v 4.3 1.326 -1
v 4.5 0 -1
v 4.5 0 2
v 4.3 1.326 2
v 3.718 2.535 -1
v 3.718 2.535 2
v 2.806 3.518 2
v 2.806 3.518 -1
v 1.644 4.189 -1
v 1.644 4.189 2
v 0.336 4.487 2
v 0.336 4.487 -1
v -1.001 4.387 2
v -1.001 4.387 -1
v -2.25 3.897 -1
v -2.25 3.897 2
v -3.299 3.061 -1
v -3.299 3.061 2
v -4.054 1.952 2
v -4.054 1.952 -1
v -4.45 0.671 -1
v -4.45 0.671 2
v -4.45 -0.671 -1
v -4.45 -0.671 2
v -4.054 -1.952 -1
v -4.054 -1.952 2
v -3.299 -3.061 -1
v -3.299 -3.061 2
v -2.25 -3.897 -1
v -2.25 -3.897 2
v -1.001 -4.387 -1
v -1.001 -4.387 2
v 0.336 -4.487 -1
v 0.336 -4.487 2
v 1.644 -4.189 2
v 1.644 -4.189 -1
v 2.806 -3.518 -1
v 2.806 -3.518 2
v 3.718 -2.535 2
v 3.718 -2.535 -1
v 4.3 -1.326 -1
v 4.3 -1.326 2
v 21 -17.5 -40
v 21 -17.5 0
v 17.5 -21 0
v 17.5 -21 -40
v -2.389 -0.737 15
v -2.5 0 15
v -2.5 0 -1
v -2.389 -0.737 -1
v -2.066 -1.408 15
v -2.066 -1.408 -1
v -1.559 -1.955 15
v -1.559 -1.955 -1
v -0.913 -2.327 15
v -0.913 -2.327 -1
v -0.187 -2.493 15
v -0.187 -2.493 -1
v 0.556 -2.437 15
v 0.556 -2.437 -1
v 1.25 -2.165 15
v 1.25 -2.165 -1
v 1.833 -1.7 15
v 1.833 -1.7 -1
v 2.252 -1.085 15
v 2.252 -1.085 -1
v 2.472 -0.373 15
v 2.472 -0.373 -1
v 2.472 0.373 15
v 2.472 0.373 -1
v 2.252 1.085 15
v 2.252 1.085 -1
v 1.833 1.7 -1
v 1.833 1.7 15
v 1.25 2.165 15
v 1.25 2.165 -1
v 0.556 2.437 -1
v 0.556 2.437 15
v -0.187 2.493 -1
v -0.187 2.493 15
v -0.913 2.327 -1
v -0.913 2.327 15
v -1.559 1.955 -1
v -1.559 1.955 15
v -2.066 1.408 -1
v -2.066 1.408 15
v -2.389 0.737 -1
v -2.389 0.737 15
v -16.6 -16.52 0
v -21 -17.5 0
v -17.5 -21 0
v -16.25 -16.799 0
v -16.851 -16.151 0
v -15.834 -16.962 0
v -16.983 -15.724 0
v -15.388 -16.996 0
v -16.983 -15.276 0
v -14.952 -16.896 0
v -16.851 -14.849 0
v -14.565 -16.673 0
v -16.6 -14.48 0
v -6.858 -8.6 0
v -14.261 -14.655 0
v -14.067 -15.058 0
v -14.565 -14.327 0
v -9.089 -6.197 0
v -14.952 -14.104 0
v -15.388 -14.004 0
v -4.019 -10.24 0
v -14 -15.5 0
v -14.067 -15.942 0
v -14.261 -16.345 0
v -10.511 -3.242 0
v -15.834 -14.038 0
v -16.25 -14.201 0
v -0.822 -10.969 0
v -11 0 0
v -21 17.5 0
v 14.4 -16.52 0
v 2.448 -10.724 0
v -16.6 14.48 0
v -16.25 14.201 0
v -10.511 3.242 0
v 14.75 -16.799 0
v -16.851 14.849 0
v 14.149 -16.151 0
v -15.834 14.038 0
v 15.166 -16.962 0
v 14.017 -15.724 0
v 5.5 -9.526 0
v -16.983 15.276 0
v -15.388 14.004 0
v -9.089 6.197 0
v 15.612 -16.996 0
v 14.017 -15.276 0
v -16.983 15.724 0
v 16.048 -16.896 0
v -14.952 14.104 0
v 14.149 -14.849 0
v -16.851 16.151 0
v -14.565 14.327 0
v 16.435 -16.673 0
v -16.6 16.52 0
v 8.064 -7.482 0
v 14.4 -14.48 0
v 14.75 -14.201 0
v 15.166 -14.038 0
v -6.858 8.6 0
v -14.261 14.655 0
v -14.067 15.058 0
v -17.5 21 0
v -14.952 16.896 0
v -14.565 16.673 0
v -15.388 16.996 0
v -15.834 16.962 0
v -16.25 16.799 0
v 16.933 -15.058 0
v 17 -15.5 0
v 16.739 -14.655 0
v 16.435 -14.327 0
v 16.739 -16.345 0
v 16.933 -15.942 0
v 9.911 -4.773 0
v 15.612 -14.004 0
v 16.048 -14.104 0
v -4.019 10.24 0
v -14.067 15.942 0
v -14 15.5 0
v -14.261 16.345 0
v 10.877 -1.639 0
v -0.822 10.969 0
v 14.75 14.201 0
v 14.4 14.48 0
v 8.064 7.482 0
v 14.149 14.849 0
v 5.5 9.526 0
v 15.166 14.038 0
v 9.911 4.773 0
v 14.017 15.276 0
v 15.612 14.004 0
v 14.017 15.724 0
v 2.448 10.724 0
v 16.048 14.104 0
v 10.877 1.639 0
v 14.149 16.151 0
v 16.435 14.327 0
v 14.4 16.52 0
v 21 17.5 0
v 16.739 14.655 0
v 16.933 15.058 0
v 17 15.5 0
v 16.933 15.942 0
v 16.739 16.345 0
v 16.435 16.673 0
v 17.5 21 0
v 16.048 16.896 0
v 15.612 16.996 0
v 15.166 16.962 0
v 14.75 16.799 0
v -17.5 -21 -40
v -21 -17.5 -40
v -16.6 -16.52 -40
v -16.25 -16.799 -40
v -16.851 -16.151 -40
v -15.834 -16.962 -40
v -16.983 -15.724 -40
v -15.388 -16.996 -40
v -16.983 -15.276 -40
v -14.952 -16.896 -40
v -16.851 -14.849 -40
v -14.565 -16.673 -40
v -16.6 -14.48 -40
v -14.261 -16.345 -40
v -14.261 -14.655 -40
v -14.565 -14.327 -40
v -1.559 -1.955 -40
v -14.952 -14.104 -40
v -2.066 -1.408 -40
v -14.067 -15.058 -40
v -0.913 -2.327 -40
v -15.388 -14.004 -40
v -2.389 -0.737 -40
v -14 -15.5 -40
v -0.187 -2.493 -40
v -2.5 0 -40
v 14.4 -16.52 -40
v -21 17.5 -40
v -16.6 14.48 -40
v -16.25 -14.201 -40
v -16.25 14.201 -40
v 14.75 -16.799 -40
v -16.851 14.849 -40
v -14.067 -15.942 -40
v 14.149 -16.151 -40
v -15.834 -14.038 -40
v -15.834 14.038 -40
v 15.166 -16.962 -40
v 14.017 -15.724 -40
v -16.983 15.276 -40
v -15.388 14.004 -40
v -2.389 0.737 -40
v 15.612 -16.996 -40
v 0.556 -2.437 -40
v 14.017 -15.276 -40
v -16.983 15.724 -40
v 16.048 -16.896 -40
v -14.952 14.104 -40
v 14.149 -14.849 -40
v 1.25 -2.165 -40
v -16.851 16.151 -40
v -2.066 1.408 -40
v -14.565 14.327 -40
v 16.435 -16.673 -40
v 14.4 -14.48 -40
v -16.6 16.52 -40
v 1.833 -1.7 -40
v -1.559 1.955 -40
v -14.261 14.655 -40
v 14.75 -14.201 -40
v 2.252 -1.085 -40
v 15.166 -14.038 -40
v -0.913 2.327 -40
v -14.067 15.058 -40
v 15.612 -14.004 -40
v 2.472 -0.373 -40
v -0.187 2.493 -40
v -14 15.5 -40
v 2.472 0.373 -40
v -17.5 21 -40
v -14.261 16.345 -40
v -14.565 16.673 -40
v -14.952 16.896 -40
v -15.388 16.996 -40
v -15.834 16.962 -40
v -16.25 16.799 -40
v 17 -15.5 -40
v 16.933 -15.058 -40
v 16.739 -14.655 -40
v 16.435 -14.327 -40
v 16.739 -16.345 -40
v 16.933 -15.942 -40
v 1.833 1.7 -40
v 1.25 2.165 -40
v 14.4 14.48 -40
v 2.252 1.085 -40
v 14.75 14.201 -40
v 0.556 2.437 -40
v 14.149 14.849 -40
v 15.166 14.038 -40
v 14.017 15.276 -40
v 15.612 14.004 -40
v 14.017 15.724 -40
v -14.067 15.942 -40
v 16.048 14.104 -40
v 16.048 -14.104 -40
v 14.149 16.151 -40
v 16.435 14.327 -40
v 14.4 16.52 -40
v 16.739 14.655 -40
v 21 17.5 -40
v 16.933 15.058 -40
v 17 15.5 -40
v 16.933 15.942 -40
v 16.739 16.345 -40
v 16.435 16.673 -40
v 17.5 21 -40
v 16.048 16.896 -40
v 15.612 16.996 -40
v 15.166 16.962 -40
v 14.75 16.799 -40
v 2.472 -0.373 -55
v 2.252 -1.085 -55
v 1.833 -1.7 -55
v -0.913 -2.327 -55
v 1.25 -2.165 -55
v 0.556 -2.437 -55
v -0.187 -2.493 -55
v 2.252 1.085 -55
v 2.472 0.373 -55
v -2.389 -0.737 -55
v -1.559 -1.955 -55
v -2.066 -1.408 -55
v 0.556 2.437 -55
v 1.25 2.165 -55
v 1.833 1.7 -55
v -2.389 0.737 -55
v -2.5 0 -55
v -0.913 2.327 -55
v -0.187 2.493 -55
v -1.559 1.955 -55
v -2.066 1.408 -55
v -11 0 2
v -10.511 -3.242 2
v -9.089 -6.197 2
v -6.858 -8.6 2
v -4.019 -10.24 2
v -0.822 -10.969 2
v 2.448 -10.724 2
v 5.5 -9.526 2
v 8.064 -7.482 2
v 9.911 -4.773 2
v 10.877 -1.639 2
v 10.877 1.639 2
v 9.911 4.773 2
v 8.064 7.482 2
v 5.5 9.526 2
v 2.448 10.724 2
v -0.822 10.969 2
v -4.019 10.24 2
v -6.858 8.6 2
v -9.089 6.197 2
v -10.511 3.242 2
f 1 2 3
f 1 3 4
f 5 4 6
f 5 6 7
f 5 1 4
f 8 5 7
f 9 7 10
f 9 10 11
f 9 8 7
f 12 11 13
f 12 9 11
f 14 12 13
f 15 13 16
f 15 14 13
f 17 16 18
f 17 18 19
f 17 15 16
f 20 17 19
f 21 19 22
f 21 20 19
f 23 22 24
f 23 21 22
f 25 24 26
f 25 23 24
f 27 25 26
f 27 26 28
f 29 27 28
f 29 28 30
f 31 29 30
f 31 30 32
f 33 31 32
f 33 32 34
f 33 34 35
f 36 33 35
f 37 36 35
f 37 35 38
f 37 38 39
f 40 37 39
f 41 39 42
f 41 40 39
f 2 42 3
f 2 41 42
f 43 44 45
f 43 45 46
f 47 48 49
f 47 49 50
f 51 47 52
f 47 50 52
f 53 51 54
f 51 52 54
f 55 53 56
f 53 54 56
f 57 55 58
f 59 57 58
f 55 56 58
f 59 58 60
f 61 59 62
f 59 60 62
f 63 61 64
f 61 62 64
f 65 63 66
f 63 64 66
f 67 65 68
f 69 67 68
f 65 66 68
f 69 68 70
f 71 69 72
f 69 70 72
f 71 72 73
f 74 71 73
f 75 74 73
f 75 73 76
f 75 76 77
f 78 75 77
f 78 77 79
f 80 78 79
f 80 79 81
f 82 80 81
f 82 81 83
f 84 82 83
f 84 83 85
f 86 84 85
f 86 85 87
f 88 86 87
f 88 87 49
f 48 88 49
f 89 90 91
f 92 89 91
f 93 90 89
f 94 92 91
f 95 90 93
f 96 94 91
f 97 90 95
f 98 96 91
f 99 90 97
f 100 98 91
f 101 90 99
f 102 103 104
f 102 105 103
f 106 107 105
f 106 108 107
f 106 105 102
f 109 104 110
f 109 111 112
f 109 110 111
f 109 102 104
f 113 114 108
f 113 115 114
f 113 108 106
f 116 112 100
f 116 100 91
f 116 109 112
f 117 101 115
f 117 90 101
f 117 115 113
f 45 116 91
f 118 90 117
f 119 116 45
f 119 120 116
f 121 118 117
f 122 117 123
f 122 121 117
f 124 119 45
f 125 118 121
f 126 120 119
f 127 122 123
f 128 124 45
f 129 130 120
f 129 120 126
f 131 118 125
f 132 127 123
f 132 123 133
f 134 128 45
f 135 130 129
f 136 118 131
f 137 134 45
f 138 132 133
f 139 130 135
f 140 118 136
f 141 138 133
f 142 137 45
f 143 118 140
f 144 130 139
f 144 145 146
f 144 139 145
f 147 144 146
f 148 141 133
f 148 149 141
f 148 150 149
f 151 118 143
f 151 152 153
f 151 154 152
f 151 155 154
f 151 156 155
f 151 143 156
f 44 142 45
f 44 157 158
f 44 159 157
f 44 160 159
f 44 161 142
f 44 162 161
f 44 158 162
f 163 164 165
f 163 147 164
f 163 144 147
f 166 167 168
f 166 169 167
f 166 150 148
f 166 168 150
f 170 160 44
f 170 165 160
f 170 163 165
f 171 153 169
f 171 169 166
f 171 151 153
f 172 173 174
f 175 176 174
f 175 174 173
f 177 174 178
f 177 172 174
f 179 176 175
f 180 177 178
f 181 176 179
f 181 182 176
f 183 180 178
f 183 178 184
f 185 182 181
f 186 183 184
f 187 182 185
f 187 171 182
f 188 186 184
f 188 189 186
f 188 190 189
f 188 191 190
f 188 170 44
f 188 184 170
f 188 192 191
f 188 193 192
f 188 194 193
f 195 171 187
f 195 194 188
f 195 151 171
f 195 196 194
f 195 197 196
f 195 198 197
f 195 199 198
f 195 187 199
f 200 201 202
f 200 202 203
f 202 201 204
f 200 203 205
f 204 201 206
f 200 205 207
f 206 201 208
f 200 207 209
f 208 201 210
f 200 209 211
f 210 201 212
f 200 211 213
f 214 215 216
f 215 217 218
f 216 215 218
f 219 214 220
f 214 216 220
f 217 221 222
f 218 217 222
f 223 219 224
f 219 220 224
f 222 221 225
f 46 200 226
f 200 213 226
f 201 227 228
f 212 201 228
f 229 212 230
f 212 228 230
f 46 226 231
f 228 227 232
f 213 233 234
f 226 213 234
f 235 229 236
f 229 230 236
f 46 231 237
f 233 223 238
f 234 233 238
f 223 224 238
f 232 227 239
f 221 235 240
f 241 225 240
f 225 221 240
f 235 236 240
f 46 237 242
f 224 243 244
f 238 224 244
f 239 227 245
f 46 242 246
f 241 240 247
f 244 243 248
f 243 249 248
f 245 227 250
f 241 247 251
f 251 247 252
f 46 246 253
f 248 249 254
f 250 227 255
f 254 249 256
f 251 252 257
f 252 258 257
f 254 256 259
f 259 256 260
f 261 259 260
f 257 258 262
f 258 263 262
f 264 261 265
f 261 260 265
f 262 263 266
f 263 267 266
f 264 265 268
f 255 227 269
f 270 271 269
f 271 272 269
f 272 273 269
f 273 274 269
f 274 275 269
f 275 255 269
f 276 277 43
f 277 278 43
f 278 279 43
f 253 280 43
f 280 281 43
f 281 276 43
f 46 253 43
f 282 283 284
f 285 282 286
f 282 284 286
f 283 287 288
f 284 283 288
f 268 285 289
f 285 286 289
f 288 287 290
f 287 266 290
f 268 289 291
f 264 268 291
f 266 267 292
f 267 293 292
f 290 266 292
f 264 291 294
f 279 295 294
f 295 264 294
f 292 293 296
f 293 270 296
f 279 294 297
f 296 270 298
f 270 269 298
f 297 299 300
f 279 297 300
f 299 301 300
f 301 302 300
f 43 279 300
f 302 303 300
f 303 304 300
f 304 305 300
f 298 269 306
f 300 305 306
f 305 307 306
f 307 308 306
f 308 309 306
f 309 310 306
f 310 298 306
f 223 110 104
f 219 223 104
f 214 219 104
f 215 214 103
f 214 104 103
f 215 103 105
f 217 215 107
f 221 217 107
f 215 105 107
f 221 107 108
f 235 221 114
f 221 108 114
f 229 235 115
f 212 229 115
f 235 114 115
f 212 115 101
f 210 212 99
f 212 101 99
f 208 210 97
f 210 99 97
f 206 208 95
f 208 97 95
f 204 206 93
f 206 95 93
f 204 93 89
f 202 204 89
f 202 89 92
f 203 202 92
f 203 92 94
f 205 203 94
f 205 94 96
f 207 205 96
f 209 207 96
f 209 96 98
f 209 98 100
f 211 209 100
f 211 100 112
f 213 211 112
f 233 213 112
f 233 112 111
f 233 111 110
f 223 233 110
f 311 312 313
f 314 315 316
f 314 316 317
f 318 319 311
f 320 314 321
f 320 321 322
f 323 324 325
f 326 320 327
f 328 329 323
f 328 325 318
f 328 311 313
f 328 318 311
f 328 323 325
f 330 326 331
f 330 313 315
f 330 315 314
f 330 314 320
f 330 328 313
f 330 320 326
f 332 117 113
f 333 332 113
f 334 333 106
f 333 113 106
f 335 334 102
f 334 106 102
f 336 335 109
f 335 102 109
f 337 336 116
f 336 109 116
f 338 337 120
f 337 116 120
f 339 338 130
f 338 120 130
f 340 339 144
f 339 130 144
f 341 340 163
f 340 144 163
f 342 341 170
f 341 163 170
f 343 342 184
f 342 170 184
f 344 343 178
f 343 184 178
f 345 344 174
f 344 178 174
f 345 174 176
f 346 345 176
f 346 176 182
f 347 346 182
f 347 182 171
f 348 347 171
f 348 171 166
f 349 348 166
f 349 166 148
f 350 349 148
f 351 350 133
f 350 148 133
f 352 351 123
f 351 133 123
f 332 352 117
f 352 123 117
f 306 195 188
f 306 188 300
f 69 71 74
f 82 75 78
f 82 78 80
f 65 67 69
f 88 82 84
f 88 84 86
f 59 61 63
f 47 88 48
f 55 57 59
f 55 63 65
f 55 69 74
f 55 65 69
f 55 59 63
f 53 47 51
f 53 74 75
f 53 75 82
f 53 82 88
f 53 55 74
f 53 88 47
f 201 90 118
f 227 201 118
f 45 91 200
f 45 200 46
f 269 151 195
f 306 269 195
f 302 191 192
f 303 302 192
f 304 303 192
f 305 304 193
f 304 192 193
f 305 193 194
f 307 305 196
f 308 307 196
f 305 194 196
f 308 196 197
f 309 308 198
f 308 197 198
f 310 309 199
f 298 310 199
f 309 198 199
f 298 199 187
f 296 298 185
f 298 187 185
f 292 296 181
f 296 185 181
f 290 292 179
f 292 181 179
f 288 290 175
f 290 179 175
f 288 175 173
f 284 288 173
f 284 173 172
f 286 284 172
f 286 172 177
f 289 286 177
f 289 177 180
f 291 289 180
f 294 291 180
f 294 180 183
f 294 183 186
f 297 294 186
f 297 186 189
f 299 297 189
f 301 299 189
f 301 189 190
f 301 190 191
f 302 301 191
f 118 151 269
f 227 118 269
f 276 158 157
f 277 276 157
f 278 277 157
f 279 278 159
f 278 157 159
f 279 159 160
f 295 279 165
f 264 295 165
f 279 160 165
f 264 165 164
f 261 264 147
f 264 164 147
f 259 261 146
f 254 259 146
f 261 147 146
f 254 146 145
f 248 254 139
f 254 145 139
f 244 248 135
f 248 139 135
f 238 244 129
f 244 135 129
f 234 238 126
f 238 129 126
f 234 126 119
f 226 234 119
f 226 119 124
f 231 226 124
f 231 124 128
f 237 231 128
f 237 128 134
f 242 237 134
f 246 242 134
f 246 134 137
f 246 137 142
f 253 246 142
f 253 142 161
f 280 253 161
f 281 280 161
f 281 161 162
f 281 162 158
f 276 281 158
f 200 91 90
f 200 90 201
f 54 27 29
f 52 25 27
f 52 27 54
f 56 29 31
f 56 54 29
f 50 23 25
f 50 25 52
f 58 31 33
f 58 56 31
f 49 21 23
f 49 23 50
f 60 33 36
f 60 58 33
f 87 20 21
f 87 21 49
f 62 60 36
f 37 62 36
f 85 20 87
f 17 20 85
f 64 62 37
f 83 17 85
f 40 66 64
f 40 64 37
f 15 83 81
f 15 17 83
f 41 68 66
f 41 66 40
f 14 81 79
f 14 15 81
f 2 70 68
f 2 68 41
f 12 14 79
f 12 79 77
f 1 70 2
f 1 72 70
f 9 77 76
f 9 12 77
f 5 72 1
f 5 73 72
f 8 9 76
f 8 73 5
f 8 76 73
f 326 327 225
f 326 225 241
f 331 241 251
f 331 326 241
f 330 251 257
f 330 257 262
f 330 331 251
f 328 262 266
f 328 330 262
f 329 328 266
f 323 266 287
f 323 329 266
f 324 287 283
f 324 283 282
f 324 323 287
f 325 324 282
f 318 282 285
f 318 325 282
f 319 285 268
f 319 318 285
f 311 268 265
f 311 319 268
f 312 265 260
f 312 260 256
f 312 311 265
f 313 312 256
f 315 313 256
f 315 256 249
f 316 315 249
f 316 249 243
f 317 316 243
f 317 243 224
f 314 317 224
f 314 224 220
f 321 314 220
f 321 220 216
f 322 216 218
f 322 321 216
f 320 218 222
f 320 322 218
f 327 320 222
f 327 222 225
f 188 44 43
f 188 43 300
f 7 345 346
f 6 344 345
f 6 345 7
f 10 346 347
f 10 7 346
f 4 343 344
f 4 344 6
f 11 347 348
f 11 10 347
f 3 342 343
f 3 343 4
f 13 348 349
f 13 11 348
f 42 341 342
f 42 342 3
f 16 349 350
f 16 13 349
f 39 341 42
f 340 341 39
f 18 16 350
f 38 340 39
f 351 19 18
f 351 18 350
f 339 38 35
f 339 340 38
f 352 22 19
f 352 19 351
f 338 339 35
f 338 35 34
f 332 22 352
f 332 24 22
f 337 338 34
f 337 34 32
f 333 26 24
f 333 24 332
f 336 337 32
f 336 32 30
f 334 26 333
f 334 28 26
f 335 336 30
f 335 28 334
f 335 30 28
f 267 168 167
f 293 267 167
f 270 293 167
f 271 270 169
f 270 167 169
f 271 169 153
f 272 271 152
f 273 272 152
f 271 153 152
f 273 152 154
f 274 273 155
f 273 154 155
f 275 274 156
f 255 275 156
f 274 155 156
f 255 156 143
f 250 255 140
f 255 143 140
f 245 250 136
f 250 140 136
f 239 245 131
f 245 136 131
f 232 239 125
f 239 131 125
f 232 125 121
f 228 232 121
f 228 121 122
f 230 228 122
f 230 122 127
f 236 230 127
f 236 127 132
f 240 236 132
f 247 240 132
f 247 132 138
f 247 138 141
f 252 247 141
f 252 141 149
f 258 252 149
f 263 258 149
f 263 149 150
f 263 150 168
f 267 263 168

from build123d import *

# Parameters (mm, degrees)
SKETCH1_W           = 42
SKETCH1_H           = 42
BOSS_EXTRUDE1_DEPTH = 40
CHAMFER1_SIZE       = 3.5
SKETCH2_R           = 11
BOSS_EXTRUDE2_DEPTH = 2
SKETCH3_R           = 1.5
CUT_EXTRUDE1_DEPTH  = 50.819674828
SKETCH4_R           = 2.5
BOSS_EXTRUDE3_DEPTH = 13
BOSS_EXTRUDE4_START = 15
SKETCH5_R           = 2.5
BOSS_EXTRUDE4_DEPTH = 15
CUT_EXTRUDE2_START  = -3
SKETCH8_R           = 4.5
SKETCH8_R_2         = 2.5
CUT_EXTRUDE2_DEPTH  = 3


with BuildPart() as part:
    # Sketch1 → Boss-Extrude1 (new body)
    with BuildSketch(Plane.XY):
        Rectangle(SKETCH1_W, SKETCH1_H)
    extrude(amount=-BOSS_EXTRUDE1_DEPTH)

    # Chamfer1
    chamfer1_edges = [part.edges().sort_by_distance(p)[0] for p in [
        (21, -21, -20),
        (-21, -21, -20),
        (-21, 21, -20),
        (21, 21, -20),
    ]]
    chamfer(chamfer1_edges, length=CHAMFER1_SIZE)

    # Sketch2 → Boss-Extrude2 (add)
    with BuildSketch(Plane.XY):
        with Locations(Location((0, 0, 0), (0, 0, 180))):
            Circle(SKETCH2_R)
    extrude(amount=BOSS_EXTRUDE2_DEPTH)

    # Sketch3 → Cut-Extrude1 (cut, through all)
    with BuildSketch(Plane.XY):
        with Locations((15.5, 15.5)):
            Circle(SKETCH3_R)
        with Locations((-15.5, 15.5)):
            Circle(SKETCH3_R)
        with Locations((-15.5, -15.5)):
            Circle(SKETCH3_R)
        with Locations((15.5, -15.5)):
            Circle(SKETCH3_R)
    extrude(amount=-CUT_EXTRUDE1_DEPTH, mode=Mode.SUBTRACT)

    # Sketch4 → Boss-Extrude3 (add)
    with BuildSketch(Plane.XY.offset(2)):
        with Locations(Location((0, 0, 0), (0, 0, 180))):
            Circle(SKETCH4_R)
    extrude(amount=BOSS_EXTRUDE3_DEPTH)

    # Sketch5 → Boss-Extrude4 (add)
    with BuildSketch(Plane(origin=(0, 0, -40), x_dir=(-1, 0, 0), z_dir=(0, 0, -1)).offset(BOSS_EXTRUDE4_START)):
        Circle(SKETCH5_R)
    extrude(amount=-BOSS_EXTRUDE4_DEPTH)

    # Sketch8 → Cut-Extrude2 (cut)
    with BuildSketch(Plane.XY.offset(2).offset(CUT_EXTRUDE2_START)):
        Circle(SKETCH8_R)
        with Locations(Location((0, 0, 0), (0, 0, 180))):
            Circle(SKETCH8_R_2, mode=Mode.SUBTRACT)
    extrude(amount=CUT_EXTRUDE2_DEPTH, mode=Mode.SUBTRACT)


solid = part.part
